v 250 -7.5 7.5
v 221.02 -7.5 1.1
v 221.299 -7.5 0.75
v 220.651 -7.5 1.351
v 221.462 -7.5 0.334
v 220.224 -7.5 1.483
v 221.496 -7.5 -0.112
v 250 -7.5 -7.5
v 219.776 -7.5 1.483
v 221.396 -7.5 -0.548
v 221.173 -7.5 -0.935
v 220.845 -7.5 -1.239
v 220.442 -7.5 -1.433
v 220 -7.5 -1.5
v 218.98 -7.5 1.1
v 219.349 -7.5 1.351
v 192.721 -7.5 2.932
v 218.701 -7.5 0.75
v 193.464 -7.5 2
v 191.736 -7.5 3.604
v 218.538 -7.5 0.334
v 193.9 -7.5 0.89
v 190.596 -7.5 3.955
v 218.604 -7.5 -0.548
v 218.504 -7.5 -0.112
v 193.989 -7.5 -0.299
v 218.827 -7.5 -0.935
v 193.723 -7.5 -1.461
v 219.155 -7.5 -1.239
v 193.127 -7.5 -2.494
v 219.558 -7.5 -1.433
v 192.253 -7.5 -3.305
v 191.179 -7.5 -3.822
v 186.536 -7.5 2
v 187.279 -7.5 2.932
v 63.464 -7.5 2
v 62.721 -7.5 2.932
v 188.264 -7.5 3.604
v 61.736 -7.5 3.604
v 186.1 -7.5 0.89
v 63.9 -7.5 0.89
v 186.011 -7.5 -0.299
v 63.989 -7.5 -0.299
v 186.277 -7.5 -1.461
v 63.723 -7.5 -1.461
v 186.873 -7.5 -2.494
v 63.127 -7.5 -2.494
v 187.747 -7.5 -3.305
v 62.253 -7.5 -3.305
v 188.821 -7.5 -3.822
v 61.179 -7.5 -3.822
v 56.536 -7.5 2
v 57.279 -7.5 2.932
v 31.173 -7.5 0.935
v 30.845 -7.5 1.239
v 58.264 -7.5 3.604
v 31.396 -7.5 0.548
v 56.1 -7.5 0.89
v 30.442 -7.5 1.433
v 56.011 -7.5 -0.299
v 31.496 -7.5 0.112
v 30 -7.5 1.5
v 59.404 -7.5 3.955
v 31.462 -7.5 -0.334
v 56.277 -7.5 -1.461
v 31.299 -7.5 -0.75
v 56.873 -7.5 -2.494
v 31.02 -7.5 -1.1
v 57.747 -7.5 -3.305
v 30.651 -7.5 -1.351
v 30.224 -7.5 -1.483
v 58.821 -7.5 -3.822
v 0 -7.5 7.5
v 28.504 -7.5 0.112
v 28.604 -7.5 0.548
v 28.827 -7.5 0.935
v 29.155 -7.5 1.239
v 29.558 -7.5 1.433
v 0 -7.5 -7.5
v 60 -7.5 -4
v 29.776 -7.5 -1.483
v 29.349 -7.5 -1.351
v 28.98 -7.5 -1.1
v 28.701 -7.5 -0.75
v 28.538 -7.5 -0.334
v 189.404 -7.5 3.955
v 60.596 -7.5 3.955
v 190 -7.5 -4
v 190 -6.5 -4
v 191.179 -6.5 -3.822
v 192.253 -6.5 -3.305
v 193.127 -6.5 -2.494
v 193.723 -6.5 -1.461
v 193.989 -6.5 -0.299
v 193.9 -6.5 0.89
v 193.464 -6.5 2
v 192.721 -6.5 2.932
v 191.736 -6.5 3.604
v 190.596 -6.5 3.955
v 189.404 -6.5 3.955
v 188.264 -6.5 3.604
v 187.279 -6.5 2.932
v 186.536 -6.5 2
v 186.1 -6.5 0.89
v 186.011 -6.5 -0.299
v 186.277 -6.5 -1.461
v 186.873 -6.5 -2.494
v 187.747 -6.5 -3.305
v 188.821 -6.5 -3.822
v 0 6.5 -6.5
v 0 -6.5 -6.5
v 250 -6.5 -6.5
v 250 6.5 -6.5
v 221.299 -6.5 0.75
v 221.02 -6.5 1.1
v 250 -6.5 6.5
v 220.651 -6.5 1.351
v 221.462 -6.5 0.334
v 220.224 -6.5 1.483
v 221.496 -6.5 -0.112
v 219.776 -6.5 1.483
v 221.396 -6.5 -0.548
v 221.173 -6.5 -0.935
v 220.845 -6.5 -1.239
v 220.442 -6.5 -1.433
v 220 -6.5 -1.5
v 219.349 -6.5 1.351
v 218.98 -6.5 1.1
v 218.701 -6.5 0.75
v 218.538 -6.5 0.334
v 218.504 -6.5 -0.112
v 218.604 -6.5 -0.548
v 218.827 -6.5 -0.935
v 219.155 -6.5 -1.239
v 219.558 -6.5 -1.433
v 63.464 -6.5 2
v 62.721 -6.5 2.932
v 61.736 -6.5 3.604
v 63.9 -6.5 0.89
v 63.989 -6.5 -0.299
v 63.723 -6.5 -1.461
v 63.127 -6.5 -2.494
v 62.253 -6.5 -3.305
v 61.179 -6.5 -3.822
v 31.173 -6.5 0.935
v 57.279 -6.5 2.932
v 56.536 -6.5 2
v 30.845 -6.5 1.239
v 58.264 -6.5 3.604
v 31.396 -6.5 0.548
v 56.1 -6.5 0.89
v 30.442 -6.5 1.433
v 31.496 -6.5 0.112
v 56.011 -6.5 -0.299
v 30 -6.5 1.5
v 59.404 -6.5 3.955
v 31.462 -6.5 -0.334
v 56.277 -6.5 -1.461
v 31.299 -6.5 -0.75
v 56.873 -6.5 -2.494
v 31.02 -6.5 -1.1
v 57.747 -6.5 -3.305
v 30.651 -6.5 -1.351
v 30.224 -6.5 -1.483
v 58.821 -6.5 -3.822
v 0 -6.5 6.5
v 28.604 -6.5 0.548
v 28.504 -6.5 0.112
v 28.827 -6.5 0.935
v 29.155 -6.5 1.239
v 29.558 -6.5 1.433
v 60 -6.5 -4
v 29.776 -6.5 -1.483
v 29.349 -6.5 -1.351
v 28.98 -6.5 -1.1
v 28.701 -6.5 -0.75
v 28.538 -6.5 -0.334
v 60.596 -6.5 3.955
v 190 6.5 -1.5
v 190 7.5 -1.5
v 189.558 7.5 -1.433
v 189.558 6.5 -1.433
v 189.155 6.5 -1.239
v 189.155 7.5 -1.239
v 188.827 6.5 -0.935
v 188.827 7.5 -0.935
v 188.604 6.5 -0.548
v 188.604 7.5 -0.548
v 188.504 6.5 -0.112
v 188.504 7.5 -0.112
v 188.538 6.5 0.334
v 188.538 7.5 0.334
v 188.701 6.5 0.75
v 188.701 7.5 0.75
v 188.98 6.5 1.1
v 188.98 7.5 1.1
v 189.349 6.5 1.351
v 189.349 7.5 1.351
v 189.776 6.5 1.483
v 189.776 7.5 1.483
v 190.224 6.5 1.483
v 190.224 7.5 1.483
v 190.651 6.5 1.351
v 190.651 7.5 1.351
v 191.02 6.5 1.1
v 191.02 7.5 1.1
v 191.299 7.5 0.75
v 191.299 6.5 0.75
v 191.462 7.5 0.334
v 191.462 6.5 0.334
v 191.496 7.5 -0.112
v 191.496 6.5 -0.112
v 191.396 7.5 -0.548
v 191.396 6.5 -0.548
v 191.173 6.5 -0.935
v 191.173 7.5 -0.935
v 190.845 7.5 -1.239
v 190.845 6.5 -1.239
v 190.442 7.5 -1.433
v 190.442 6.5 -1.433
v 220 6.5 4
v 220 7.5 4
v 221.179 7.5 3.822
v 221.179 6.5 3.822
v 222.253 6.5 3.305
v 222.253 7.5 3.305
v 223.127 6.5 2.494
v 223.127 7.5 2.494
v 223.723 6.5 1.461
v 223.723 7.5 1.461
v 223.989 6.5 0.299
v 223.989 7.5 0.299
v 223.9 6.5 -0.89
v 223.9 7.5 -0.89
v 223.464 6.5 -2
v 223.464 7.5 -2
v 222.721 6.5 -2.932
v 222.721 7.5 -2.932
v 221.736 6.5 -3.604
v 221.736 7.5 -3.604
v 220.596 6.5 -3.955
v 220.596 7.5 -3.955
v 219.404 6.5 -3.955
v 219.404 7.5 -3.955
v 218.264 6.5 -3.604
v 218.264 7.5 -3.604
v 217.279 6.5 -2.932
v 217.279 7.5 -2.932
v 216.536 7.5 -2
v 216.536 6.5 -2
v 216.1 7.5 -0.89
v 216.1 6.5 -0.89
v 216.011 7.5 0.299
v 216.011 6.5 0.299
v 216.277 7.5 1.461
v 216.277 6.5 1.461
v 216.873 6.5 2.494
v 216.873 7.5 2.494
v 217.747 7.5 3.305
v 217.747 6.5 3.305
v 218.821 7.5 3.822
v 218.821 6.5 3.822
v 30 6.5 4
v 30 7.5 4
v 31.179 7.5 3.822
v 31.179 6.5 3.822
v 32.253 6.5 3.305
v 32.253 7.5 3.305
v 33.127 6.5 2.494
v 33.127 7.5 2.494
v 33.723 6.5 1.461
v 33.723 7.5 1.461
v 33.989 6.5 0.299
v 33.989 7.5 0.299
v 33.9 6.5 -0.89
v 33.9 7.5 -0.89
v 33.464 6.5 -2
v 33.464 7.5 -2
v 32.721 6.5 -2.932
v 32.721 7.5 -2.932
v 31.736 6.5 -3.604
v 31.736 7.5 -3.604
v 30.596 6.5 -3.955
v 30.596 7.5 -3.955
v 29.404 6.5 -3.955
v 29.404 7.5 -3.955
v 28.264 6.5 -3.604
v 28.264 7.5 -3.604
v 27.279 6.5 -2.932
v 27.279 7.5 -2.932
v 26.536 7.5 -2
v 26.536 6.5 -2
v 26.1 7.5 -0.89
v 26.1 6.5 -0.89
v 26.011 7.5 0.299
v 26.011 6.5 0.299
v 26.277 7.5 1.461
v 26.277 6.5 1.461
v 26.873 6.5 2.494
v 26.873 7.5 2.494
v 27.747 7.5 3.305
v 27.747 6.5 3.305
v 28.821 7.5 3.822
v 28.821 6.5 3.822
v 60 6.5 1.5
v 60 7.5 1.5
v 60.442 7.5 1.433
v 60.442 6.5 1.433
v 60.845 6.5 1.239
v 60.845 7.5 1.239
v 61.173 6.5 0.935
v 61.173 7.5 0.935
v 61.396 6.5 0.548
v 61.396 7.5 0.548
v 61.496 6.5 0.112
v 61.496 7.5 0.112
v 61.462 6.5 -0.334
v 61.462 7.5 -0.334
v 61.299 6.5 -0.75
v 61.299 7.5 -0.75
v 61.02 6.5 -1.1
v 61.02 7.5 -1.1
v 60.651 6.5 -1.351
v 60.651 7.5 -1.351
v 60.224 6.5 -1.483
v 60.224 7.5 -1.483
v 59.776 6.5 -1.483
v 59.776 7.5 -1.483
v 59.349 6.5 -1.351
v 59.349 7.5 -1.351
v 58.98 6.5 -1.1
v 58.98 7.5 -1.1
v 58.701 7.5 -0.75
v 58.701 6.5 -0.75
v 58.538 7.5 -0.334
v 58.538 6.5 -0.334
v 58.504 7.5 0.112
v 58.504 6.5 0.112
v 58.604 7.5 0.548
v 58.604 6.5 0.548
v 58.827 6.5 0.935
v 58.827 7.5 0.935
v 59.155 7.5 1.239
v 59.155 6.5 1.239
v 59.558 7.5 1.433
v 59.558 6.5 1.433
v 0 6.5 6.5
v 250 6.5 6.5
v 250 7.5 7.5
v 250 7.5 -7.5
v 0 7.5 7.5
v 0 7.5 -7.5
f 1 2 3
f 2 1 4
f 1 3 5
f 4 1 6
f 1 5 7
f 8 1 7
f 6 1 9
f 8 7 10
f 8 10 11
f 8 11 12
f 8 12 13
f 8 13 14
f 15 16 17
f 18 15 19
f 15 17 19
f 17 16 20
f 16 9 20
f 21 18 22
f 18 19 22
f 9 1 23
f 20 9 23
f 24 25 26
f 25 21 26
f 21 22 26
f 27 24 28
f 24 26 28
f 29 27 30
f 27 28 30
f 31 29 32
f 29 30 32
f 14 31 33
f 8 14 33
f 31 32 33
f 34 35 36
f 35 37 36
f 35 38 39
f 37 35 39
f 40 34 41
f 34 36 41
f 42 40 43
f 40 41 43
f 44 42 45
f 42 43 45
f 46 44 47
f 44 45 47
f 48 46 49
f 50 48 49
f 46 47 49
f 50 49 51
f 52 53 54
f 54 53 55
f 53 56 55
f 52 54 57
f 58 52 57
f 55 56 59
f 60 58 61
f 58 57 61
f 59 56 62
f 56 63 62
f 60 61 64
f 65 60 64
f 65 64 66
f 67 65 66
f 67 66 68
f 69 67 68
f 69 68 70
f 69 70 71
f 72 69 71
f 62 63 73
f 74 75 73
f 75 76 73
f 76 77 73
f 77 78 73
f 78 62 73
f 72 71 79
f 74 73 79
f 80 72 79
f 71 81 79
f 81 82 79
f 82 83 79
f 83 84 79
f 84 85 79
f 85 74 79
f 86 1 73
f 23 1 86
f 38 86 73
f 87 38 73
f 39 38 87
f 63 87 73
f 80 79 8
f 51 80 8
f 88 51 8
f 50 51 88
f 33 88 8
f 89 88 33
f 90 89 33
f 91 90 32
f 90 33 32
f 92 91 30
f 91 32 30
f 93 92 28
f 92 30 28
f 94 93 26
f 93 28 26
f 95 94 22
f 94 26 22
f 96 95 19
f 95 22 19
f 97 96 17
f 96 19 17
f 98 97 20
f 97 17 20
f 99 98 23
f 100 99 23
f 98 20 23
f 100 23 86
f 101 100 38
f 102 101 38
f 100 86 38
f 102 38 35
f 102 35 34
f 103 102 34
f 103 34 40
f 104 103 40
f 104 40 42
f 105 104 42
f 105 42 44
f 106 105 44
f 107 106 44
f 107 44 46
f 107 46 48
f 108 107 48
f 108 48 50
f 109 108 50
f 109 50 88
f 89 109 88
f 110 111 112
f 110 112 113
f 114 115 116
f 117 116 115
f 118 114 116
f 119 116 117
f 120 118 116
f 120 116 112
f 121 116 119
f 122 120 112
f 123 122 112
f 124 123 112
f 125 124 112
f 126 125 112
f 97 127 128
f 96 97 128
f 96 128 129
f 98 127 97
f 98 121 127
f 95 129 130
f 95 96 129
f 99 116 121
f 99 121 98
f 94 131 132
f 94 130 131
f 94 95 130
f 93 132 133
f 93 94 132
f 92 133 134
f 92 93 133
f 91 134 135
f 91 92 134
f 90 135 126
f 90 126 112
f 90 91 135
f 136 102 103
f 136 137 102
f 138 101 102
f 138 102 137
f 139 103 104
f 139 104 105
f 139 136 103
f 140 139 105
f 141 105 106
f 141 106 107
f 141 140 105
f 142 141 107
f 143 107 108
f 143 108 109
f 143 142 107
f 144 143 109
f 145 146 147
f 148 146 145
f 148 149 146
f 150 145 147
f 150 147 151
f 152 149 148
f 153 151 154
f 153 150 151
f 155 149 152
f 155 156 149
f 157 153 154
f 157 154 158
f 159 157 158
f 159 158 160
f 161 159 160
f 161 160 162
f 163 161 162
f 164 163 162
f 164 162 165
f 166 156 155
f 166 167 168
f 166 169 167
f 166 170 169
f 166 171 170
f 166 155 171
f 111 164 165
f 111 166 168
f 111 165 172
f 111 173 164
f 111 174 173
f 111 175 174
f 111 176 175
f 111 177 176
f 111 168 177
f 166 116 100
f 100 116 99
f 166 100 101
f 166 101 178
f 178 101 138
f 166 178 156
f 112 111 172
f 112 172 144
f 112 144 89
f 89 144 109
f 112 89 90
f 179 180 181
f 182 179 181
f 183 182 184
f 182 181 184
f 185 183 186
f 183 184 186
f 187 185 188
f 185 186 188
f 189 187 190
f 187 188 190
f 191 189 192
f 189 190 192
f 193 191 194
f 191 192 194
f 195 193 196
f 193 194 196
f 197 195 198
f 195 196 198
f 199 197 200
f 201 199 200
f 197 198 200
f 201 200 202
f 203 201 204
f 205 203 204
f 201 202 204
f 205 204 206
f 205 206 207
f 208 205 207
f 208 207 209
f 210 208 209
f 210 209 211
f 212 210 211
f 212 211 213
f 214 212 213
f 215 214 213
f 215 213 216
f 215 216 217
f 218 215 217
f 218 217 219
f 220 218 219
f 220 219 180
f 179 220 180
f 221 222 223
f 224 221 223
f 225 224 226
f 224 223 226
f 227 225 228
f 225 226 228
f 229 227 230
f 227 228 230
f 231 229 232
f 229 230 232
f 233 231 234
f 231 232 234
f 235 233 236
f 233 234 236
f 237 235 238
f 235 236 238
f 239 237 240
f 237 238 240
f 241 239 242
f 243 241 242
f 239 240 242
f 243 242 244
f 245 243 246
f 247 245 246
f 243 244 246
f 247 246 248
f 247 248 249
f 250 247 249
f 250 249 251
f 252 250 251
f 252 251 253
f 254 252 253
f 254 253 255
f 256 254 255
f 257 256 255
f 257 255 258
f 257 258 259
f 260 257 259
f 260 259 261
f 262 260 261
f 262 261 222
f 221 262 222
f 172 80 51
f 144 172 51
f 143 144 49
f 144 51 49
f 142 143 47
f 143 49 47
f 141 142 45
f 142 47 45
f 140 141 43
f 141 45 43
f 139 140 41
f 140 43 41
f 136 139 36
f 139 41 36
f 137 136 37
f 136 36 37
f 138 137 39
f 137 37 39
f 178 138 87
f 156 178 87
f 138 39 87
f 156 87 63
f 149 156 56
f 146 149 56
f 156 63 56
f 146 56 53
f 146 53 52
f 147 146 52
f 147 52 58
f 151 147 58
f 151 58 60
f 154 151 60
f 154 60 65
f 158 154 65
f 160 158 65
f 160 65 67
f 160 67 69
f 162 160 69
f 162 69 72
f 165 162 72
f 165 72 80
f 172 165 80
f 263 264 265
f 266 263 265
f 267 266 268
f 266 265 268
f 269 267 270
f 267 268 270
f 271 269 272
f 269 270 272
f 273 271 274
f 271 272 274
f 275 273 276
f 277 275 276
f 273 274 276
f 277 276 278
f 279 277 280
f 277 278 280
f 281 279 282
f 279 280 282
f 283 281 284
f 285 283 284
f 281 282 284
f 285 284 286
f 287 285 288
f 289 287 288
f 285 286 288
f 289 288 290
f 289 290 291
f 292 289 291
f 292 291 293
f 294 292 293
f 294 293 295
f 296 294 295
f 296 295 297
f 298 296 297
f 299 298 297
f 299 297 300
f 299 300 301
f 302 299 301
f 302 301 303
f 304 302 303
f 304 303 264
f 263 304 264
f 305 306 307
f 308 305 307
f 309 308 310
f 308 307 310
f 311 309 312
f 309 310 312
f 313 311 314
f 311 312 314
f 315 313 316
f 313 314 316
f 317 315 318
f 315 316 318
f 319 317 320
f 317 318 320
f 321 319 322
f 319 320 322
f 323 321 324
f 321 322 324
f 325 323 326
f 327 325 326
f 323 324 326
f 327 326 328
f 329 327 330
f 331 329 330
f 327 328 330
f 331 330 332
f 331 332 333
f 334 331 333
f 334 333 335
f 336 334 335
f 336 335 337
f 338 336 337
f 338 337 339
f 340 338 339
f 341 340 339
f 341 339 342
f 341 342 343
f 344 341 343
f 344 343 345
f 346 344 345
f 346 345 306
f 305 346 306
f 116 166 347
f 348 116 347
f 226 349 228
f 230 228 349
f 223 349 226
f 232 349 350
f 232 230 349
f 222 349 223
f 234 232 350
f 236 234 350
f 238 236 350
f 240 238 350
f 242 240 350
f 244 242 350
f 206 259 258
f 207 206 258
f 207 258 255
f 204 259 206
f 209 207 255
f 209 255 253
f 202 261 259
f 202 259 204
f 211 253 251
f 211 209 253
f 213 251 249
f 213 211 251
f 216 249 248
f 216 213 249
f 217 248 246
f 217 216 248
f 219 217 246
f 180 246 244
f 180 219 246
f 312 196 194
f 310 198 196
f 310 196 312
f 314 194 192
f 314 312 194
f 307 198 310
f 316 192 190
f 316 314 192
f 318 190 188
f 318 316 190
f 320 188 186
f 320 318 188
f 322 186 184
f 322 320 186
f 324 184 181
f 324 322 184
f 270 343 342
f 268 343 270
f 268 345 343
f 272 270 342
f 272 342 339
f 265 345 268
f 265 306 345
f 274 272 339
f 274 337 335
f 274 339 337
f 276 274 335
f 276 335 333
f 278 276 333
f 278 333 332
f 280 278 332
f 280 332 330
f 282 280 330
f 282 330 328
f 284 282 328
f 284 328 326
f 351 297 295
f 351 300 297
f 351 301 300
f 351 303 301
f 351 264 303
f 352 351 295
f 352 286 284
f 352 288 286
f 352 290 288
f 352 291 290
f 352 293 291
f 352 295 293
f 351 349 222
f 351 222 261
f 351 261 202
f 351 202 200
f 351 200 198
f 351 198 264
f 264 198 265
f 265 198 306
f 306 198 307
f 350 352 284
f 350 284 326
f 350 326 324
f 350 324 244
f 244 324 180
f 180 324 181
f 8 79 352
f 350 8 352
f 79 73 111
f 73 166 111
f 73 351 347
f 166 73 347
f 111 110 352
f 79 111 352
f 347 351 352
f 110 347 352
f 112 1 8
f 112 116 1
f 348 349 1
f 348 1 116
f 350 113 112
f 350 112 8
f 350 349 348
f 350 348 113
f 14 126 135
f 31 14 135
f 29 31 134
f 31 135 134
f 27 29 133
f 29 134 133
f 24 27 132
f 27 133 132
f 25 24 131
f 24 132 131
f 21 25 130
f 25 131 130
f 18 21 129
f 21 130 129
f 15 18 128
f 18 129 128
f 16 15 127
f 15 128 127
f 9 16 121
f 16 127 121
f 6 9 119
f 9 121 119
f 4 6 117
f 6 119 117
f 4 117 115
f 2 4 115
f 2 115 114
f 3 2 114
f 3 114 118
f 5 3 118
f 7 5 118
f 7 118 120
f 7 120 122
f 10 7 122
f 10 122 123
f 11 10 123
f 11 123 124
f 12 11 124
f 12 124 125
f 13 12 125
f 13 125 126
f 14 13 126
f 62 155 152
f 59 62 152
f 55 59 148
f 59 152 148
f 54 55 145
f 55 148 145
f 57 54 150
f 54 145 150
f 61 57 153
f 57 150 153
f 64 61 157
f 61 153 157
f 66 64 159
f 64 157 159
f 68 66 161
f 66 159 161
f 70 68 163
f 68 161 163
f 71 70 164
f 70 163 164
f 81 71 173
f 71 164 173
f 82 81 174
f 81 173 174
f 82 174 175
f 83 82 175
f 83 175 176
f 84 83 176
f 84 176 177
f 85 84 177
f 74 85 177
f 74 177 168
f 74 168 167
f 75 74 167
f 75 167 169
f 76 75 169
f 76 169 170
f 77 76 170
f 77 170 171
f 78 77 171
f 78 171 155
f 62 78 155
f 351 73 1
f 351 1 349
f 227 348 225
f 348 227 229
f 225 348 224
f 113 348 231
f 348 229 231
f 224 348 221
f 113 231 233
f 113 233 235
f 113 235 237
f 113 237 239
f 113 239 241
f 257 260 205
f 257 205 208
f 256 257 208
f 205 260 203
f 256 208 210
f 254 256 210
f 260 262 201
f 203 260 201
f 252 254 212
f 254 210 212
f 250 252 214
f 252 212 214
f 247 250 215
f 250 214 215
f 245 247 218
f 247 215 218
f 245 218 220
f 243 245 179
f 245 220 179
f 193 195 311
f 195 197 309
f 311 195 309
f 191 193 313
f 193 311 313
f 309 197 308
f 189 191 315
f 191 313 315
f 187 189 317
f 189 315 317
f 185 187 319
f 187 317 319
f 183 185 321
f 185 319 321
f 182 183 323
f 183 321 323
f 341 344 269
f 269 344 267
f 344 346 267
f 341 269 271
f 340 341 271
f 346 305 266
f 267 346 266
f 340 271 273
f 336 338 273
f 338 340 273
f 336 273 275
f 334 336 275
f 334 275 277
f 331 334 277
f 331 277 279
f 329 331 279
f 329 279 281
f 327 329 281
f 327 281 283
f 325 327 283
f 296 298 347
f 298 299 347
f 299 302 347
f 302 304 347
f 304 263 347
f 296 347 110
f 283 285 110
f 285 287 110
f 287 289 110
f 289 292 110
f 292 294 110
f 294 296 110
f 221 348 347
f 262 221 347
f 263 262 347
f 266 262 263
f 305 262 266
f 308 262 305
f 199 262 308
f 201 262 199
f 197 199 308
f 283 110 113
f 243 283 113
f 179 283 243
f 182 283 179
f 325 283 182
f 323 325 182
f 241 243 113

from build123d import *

# Parameters (mm, degrees)
SKETCH_1_W          = 15
SKETCH_1_H          = 15
SKETCH_1_W_2        = 13
SKETCH_1_H_2        = 13
EXTRUDE_1_DEPTH     = 250
SKETCH_2_R          = 1.5
CUT_EXTRUDE_1_DEPTH = 250
SKETCH_3_R          = 4
CUT_EXTRUDE_2_DEPTH = 10
SKETCH_4_R          = 4
CUT_EXTRUDE_3_DEPTH = 10


with BuildPart() as part:
    # 草图1 → 凸台-拉伸1 (new body)
    with BuildSketch(Plane(origin=(0, 0, 0), x_dir=(0, 0, -1), z_dir=(1, 0, 0))):
        Rectangle(SKETCH_1_W, SKETCH_1_H)
        Rectangle(SKETCH_1_W_2, SKETCH_1_H_2, mode=Mode.SUBTRACT)
    extrude(amount=EXTRUDE_1_DEPTH)

    # 草图2 → 切除-拉伸1 (cut)
    with BuildSketch(Plane(origin=(0, 7.5, 0), x_dir=(1, 0, 0), z_dir=(0, 1, 0))):
        with Locations(Location((30, 0, 0), (0, 0, 270))):
            Circle(SKETCH_2_R)
        with Locations(Location((60, 0, 0), (0, 0, 270))):
            Circle(SKETCH_2_R)
        with Locations(Location((190, 0, 0), (0, 0, 90))):
            Circle(SKETCH_2_R)
        with Locations(Location((220, 0, 0), (0, 0, 90))):
            Circle(SKETCH_2_R)
    extrude(amount=-CUT_EXTRUDE_1_DEPTH, mode=Mode.SUBTRACT)

    # 草图3 → 切除-拉伸2 (cut)
    with BuildSketch(Plane(origin=(0, 7.5, 0), x_dir=(1, 0, 0), z_dir=(0, 1, 0))):
        with Locations(Location((30, 0, 0), (0, 0, 270))):
            Circle(SKETCH_3_R)
        with Locations(Location((220, 0, 0), (0, 0, 270))):
            Circle(SKETCH_3_R)
    extrude(amount=-CUT_EXTRUDE_2_DEPTH, mode=Mode.SUBTRACT)

    # 草图4 → 切除-拉伸3 (cut)
    with BuildSketch(Plane.XZ.offset(7.5)):
        with Locations(Location((60, 0, 0), (0, 0, 270))):
            Circle(SKETCH_4_R)
        with Locations(Location((190, 0, 0), (0, 0, 270))):
            Circle(SKETCH_4_R)
    extrude(amount=-CUT_EXTRUDE_3_DEPTH, mode=Mode.SUBTRACT)


solid = part.part
